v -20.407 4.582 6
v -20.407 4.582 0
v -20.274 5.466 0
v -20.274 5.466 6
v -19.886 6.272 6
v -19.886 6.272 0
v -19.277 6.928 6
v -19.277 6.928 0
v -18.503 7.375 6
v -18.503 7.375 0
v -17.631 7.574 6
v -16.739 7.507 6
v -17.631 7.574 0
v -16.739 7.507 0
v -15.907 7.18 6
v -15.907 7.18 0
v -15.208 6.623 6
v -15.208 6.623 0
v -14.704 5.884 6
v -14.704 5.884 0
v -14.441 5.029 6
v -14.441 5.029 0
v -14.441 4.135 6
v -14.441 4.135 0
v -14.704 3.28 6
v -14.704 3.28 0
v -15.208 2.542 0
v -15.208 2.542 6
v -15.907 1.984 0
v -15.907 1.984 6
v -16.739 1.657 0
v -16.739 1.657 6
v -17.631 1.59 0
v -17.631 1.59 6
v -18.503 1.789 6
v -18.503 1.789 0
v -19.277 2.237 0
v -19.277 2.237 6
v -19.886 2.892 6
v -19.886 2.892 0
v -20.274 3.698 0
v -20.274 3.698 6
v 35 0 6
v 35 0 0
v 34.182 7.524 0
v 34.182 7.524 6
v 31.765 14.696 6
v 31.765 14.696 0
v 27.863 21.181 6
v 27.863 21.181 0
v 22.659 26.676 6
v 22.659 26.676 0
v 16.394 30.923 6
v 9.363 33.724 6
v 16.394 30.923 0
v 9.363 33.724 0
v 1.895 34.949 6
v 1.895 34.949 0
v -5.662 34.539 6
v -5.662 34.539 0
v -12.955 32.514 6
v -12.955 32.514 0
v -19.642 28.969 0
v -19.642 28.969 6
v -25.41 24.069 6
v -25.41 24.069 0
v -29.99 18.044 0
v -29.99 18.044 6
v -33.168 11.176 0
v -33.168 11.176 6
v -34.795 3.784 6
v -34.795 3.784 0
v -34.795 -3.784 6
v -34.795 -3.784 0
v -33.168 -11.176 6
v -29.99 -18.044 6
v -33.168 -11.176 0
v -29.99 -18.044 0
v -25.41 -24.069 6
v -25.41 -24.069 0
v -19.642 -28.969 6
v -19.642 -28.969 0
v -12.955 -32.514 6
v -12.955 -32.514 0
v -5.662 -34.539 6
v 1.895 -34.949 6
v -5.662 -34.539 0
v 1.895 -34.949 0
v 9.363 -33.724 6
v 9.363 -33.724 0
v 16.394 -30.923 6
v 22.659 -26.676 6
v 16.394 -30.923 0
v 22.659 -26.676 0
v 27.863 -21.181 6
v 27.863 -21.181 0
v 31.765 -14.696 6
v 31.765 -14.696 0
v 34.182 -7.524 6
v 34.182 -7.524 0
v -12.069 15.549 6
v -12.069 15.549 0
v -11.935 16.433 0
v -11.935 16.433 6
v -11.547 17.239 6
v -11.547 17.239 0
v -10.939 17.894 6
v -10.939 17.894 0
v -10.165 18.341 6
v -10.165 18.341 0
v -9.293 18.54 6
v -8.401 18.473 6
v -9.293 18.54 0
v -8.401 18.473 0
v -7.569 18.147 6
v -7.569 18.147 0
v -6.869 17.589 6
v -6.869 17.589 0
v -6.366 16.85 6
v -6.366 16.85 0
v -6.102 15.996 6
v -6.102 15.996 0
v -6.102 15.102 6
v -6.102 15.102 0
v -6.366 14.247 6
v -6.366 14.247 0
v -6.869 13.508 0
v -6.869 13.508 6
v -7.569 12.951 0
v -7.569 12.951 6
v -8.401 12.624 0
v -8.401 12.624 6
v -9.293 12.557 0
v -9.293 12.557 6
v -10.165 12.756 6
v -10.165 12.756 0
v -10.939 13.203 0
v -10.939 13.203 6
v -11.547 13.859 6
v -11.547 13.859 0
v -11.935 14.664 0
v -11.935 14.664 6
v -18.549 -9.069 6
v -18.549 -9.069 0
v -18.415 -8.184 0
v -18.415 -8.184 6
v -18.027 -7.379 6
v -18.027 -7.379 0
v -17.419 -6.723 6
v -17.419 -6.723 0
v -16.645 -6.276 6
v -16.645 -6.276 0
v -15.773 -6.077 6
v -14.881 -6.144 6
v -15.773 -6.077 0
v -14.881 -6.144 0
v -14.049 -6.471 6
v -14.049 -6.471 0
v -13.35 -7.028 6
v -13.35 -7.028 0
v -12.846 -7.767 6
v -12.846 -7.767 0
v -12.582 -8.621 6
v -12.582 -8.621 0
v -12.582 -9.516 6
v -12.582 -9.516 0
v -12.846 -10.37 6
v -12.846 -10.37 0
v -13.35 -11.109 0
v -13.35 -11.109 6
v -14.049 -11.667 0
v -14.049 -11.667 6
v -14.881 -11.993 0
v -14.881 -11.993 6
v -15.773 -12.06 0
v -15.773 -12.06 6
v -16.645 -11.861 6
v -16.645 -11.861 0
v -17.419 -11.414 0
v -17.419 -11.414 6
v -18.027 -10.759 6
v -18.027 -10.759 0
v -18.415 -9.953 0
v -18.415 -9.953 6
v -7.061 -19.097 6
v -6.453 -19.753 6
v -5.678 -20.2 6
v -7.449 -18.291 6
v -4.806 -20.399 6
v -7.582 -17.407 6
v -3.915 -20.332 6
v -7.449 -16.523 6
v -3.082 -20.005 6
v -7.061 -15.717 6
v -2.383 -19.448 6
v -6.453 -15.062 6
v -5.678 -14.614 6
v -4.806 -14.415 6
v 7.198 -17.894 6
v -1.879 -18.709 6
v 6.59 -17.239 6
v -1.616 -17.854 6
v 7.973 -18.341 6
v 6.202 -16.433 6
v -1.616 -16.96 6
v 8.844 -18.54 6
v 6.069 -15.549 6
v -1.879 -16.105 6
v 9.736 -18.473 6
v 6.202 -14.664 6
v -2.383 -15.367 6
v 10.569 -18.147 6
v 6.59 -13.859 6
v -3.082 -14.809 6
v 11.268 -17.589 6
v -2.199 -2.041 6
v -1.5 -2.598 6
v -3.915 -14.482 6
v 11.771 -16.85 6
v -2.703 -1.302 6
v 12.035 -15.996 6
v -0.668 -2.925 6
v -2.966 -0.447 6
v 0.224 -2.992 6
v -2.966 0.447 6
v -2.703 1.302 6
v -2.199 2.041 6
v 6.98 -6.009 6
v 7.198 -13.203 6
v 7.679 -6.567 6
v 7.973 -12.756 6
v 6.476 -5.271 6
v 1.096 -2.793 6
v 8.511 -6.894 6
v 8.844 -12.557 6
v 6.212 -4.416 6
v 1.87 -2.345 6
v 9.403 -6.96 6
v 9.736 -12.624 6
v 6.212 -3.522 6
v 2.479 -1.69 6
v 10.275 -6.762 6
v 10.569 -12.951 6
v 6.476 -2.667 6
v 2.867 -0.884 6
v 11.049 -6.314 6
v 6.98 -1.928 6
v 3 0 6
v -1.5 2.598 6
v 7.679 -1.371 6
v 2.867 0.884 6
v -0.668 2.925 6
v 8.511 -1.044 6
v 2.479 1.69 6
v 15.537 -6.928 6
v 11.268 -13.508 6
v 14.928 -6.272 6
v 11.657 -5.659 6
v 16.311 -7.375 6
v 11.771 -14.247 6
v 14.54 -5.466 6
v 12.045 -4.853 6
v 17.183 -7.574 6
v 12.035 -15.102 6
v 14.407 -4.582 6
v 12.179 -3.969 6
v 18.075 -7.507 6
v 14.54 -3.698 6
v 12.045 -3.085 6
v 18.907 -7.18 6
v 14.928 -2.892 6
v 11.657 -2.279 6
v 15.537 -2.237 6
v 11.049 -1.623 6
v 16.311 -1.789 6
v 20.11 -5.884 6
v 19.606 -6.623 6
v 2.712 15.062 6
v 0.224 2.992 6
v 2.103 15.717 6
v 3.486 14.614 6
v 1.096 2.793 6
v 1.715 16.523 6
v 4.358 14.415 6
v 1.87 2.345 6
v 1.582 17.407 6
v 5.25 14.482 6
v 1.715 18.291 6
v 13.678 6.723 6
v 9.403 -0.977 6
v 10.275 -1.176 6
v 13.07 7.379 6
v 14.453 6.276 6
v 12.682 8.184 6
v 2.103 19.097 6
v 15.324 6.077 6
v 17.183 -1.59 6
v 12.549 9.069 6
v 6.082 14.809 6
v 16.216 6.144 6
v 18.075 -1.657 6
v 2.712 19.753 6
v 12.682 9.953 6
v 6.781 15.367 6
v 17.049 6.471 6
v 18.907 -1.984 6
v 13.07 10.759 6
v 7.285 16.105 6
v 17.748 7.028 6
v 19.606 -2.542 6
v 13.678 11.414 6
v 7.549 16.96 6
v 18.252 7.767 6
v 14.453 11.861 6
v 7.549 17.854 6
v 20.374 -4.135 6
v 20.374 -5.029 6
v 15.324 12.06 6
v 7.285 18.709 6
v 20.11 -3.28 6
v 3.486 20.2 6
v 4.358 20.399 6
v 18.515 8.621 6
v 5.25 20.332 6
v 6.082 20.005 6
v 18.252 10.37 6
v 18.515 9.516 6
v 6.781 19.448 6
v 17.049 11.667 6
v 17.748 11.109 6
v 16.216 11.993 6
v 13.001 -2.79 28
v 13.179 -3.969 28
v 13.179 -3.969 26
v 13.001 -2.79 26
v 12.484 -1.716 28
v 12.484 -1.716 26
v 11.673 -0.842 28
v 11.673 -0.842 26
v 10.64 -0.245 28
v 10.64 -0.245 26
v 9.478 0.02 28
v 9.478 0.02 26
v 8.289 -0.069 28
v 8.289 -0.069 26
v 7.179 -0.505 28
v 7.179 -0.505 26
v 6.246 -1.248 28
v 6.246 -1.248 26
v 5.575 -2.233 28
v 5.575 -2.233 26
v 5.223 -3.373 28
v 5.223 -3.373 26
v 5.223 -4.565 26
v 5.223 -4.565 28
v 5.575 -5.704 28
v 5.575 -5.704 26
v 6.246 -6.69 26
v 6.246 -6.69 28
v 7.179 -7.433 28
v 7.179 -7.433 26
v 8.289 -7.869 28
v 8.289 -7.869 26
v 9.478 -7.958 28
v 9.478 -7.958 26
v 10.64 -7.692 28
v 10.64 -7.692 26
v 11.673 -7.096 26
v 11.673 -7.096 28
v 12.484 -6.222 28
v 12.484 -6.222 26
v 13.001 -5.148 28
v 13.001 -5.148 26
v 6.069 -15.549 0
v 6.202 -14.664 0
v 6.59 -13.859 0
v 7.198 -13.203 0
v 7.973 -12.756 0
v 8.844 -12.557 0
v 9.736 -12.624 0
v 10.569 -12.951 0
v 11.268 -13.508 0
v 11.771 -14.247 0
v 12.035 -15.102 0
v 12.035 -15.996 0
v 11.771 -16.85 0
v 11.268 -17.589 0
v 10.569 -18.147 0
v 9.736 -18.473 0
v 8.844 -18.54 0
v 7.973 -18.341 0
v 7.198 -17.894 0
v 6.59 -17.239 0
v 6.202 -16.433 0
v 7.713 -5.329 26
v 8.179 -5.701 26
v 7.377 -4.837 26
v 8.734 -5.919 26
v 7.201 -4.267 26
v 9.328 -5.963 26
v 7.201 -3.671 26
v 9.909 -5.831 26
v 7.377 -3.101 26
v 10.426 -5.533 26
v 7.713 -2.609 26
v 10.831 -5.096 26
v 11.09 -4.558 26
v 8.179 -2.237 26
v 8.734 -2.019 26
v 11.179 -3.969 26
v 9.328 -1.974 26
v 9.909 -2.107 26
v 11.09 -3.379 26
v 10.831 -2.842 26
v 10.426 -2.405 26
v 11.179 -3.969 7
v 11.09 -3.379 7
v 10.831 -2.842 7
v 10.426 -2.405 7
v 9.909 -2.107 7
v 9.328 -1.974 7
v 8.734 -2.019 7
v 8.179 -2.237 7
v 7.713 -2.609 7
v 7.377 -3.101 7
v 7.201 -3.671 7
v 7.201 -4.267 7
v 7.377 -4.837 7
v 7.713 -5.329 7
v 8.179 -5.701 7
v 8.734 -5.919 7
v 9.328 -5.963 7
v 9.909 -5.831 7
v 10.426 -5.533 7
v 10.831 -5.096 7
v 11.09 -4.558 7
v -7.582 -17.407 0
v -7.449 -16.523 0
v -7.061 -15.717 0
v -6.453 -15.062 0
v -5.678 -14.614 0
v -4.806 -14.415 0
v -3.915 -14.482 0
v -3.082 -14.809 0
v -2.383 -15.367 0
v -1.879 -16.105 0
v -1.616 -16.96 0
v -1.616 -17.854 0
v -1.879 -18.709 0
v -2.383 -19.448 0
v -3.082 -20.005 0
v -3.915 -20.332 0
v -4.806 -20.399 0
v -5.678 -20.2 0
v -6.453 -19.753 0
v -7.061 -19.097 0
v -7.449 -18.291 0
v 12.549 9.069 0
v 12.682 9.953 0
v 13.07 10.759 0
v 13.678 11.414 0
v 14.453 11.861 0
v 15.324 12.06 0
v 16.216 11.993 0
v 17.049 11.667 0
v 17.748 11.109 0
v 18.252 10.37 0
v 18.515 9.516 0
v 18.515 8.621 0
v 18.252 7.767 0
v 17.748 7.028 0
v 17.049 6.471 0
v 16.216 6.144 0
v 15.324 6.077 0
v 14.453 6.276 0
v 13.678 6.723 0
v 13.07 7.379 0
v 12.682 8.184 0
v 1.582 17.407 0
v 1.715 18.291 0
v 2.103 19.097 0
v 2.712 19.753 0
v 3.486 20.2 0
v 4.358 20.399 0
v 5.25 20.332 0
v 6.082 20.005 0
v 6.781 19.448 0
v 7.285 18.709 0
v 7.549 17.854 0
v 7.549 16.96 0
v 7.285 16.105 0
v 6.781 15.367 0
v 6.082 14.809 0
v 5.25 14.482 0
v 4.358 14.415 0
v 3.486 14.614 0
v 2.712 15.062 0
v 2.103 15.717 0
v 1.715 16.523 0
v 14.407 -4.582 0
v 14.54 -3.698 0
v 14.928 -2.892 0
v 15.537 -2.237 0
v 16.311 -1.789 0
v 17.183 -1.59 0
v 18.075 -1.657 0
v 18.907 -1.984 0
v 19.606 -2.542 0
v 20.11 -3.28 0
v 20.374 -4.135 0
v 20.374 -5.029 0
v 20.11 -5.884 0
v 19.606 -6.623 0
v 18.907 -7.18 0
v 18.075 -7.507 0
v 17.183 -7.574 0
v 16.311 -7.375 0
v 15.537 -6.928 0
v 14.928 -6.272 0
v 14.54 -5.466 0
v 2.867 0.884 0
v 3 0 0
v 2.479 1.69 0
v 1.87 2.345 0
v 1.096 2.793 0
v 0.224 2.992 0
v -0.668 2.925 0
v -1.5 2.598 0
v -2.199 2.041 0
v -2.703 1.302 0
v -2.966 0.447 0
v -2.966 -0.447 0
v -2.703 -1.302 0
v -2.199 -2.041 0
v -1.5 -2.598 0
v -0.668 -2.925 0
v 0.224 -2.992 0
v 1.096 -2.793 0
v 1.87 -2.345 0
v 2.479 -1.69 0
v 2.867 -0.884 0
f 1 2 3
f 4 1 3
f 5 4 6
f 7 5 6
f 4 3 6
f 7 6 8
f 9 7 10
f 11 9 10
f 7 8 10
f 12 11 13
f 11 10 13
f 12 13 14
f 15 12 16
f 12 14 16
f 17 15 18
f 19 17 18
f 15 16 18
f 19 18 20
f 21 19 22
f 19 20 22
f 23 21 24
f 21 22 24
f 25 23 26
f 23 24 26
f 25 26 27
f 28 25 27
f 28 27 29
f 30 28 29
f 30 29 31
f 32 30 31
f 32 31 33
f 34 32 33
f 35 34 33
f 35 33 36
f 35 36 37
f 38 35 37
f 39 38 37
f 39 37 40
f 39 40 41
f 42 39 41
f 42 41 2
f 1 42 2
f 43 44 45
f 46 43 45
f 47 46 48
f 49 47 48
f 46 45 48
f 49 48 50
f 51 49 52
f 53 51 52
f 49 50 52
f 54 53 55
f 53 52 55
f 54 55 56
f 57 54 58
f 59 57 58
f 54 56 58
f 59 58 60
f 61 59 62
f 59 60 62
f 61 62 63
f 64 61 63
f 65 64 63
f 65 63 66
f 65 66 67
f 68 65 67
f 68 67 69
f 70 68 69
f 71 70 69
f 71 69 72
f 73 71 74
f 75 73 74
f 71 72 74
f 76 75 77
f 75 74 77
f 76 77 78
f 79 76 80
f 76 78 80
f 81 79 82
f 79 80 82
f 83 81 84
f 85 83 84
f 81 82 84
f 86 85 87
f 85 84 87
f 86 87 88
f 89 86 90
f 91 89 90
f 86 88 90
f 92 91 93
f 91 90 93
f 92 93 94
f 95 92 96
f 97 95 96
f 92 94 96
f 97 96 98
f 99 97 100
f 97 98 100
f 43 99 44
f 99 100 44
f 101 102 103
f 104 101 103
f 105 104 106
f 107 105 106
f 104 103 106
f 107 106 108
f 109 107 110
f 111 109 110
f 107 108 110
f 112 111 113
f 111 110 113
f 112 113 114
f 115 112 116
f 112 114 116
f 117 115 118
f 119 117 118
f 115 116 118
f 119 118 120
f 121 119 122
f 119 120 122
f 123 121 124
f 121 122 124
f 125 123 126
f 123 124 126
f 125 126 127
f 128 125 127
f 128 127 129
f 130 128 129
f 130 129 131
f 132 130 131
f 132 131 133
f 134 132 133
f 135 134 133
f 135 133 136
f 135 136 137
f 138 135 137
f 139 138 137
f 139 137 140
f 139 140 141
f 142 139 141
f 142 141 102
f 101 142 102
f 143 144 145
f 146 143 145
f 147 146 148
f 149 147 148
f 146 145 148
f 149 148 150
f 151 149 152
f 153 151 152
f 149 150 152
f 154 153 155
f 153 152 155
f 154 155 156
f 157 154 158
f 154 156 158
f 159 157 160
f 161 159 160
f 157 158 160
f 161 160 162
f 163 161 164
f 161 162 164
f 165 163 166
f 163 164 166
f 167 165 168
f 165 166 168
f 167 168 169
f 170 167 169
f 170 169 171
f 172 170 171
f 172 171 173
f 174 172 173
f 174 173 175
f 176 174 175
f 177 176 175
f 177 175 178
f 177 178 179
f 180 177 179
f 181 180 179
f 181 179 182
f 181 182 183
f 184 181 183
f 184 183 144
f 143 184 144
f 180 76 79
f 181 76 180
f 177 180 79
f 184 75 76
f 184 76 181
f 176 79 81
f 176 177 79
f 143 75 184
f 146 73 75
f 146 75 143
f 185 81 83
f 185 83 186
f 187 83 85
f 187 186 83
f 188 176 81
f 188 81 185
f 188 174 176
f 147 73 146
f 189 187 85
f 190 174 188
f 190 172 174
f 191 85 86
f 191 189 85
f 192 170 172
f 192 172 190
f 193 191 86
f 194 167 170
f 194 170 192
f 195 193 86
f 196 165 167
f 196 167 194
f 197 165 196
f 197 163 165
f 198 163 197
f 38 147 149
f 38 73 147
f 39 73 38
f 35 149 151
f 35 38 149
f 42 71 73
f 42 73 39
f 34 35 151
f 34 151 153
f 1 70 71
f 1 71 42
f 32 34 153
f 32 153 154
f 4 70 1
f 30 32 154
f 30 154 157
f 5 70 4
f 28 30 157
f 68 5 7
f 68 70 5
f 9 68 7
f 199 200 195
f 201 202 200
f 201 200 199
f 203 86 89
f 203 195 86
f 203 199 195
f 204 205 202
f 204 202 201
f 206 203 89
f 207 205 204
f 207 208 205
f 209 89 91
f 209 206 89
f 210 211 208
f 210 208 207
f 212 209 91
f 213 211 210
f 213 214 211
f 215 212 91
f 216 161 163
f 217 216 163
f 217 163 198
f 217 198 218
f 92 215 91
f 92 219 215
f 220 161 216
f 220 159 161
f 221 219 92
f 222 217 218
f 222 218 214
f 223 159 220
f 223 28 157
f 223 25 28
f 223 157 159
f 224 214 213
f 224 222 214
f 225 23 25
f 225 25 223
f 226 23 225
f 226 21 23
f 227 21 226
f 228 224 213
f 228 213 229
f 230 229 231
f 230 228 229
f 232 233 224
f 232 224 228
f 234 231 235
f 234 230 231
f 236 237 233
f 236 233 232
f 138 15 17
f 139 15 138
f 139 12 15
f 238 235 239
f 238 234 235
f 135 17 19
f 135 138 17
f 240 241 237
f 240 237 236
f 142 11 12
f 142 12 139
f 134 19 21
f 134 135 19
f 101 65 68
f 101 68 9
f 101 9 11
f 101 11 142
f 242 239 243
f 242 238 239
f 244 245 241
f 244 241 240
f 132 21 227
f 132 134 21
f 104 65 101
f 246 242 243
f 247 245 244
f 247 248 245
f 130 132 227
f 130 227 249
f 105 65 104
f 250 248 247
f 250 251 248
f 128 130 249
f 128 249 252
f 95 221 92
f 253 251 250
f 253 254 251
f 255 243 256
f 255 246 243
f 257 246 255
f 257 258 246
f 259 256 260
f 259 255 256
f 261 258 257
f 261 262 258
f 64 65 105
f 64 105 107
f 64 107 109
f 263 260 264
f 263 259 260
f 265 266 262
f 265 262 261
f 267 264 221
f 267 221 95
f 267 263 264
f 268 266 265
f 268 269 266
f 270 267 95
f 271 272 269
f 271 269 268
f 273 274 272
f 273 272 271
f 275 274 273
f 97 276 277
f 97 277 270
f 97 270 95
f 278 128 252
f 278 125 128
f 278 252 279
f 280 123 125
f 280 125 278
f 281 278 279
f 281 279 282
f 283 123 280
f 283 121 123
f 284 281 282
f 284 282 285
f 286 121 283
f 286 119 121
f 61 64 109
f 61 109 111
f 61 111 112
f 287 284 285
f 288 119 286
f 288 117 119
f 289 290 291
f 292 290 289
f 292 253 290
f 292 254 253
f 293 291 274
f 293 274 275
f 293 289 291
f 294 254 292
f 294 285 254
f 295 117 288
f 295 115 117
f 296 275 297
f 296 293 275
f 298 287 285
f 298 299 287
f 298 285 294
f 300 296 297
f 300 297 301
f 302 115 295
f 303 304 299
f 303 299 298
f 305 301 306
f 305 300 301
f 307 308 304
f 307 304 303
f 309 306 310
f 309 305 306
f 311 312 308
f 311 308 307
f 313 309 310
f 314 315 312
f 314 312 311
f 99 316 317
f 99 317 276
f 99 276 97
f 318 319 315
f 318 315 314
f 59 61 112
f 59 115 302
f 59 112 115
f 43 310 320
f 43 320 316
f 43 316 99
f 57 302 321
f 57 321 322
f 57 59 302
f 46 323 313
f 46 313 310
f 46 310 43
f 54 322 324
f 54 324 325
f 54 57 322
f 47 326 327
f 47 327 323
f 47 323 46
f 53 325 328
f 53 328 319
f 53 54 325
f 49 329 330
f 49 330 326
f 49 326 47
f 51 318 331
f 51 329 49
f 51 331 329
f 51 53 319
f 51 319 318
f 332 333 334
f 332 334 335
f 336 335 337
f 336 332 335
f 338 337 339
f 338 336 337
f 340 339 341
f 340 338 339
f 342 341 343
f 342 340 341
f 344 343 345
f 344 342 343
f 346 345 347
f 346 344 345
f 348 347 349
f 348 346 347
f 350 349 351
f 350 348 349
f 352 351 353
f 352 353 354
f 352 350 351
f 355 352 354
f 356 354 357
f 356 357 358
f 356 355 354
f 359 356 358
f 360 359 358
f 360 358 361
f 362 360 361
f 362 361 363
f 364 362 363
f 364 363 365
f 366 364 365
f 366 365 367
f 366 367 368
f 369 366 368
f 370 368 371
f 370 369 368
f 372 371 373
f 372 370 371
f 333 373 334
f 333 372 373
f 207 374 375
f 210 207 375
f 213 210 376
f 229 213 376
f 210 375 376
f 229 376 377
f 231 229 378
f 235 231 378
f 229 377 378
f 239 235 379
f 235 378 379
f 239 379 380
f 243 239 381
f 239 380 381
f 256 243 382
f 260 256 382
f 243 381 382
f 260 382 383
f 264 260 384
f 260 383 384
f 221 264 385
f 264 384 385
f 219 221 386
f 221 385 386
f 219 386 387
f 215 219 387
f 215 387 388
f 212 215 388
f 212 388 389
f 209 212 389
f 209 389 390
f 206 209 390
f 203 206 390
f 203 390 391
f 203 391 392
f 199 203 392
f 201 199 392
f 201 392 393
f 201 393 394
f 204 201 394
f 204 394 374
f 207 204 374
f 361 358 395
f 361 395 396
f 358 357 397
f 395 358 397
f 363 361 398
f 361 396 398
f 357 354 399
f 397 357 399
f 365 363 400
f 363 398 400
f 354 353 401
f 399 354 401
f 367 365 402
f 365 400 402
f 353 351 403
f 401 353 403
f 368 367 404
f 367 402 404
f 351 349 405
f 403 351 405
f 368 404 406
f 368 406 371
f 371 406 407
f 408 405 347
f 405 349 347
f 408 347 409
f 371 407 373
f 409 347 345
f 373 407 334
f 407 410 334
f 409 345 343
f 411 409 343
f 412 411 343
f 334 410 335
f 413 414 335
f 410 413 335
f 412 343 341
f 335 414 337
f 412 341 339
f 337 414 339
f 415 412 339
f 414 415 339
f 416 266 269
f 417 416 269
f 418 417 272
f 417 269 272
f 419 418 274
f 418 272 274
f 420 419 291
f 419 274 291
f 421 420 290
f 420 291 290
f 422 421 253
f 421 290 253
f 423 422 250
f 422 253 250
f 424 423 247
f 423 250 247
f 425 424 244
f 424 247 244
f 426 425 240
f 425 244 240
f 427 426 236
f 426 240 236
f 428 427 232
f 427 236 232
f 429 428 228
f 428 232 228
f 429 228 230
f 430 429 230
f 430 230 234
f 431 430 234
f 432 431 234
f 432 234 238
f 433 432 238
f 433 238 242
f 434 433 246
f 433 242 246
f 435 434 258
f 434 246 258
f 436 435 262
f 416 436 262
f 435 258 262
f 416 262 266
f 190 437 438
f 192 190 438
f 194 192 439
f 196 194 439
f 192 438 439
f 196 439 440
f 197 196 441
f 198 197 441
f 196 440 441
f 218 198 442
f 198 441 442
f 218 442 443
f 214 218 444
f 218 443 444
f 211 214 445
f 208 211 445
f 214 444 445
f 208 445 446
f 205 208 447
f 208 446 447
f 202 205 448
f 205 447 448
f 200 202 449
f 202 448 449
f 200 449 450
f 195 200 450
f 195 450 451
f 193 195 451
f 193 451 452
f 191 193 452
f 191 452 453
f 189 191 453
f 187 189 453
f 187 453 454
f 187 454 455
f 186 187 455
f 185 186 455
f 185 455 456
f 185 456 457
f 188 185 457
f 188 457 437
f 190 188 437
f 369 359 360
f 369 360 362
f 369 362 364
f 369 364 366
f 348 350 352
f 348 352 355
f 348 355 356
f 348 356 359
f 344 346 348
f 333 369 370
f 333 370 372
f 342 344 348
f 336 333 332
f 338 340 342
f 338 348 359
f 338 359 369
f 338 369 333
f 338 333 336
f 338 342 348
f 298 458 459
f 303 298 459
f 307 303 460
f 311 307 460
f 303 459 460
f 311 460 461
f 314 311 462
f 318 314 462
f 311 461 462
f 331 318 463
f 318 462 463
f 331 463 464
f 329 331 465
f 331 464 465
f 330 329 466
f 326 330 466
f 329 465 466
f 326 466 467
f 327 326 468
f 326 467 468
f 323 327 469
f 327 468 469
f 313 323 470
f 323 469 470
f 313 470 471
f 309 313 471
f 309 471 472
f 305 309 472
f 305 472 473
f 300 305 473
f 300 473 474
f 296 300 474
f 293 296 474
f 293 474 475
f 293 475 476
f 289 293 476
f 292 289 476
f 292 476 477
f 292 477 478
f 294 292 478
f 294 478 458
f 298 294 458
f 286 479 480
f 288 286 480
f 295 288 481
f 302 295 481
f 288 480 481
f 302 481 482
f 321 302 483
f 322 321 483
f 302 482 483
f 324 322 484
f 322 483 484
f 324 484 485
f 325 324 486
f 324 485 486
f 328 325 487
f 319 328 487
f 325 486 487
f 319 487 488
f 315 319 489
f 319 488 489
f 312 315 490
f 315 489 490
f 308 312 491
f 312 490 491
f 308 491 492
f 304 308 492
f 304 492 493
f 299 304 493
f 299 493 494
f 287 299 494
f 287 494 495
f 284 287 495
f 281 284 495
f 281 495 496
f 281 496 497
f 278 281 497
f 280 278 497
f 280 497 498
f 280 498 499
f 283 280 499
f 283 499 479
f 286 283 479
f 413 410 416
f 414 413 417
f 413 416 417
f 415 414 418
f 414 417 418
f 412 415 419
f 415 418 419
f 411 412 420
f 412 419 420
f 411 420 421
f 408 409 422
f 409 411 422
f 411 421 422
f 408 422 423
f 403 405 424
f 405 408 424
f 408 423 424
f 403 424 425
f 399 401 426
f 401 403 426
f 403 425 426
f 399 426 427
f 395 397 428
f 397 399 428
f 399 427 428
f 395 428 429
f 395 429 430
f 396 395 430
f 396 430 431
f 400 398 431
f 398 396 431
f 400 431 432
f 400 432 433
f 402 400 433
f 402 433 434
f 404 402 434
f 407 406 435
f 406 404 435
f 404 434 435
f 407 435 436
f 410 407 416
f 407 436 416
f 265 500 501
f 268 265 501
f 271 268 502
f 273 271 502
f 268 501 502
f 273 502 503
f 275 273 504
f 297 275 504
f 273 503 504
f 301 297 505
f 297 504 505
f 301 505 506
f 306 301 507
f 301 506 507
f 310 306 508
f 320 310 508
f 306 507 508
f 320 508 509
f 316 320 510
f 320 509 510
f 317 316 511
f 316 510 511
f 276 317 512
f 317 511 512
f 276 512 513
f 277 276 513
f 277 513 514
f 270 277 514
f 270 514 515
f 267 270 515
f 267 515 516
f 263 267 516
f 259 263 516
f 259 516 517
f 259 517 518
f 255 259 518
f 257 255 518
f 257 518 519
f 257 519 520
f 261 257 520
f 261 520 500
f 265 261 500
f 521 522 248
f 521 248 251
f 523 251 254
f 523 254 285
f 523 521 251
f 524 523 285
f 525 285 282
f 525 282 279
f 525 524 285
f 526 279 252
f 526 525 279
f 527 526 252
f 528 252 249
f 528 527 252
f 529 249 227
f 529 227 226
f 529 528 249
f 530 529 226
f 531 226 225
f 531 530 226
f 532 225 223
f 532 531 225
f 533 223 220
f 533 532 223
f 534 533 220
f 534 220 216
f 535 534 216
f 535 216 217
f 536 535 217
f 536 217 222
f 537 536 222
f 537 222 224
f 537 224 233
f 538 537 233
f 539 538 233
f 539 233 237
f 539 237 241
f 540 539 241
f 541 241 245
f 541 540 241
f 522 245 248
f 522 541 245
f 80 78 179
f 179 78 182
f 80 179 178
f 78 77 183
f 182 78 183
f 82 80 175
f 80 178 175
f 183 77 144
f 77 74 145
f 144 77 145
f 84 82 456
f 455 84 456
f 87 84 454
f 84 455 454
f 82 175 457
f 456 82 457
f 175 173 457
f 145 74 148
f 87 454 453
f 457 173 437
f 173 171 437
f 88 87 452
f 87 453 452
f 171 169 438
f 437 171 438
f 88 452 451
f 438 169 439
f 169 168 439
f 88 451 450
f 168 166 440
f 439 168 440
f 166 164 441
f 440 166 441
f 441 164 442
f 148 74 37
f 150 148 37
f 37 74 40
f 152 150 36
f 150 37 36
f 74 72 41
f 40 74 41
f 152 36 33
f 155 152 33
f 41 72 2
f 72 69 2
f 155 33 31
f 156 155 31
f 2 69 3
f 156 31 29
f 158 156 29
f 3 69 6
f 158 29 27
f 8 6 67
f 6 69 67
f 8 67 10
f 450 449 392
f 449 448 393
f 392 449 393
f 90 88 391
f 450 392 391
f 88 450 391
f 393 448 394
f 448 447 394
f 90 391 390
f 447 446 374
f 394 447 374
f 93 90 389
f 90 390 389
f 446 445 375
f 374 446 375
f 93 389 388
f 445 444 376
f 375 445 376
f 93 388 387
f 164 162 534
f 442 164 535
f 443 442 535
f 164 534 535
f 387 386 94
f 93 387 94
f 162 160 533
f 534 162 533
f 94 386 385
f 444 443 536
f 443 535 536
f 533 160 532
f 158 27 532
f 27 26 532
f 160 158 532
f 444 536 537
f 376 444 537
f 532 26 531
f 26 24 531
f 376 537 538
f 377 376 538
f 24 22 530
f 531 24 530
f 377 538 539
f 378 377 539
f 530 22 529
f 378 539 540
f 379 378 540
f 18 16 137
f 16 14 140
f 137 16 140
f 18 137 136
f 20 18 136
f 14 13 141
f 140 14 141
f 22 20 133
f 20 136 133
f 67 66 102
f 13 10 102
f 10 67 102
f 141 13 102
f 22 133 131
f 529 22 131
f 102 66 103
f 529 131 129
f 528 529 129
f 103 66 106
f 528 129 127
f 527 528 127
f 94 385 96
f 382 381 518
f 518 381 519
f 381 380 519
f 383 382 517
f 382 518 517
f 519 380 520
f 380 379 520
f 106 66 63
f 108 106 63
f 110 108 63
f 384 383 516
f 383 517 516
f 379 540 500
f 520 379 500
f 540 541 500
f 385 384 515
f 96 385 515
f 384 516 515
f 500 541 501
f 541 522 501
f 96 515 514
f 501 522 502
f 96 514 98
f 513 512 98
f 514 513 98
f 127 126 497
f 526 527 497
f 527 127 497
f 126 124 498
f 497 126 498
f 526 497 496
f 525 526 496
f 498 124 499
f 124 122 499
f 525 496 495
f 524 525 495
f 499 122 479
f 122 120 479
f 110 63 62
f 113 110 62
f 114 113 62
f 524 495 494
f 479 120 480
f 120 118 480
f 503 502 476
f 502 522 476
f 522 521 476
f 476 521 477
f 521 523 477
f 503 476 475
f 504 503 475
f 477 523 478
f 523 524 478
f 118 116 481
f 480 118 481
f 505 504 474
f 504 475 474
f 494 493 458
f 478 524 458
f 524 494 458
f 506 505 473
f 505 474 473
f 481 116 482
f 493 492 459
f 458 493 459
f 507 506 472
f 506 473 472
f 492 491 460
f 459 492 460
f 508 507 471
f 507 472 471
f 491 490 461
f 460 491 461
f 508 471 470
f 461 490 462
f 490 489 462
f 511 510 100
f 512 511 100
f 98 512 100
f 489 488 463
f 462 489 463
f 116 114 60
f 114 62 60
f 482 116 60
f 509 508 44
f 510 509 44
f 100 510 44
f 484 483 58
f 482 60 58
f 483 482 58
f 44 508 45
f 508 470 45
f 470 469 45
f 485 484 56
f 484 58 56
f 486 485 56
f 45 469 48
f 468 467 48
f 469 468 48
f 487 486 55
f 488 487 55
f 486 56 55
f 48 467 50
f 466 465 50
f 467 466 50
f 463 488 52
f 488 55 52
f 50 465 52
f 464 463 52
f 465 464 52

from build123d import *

# Parameters (mm, degrees)
SKETCH_1_R          = 35
SKETCH_1_R_2        = 3
EXTRUDE_1_DEPTH     = 6
SKETCH_3_R          = 3
CUT_EXTRUDE_2_DEPTH = 50.859803449
SKETCH_4_R          = 2
EXTRUDE_2_DEPTH     = 22
SKETCH_7_R          = 4
EXTRUDE_3_DEPTH     = 2
CHAMFER_1_SIZE      = 1


with BuildPart() as part:
    # 草图1 → 凸台-拉伸1 (new body)
    with BuildSketch(Plane.XY):
        Circle(SKETCH_1_R)
        Circle(SKETCH_1_R_2, mode=Mode.SUBTRACT)
    extrude(amount=EXTRUDE_1_DEPTH)

    # 草图3 → 切除-拉伸2 (cut, through all)
    with BuildSketch(Plane(origin=(0, 0, 0), x_dir=(-1, 0, 0), z_dir=(0, 0, -1))):
        with Locations((-4.582105158, 17.407019053)):
            Circle(SKETCH_3_R)
        with Locations((9.068583583, 15.548658842)):
            Circle(SKETCH_3_R)
        with Locations((17.407019053, 4.582105158)):
            Circle(SKETCH_3_R)
        with Locations((15.548658842, -9.068583583)):
            Circle(SKETCH_3_R)
        with Locations((4.582105158, -17.407019053)):
            Circle(SKETCH_3_R)
        with Locations((-9.068583583, -15.548658842)):
            Circle(SKETCH_3_R)
        with Locations((-17.407019053, -4.582105158)):
            Circle(SKETCH_3_R)
        with Locations((-15.548658842, 9.068583583)):
            Circle(SKETCH_3_R)
    extrude(amount=-CUT_EXTRUDE_2_DEPTH, mode=Mode.SUBTRACT)

    # 草图4 → 凸台-拉伸2 (add)
    with BuildSketch(Plane.XY.offset(6)):
        with Locations((9.178670771, -3.968879298)):
            Circle(SKETCH_4_R)
    extrude(amount=EXTRUDE_2_DEPTH)

    # 草图7 → 凸台-拉伸3 (add)
    with BuildSketch(Plane.XY.offset(28)):
        with Locations((9.178670771, -3.968879298)):
            Circle(SKETCH_7_R)
    extrude(amount=-EXTRUDE_3_DEPTH)

    # 倒角1
    chamfer_1_edges = [part.edges().sort_by_distance(p)[0] for p in [
        (7.178670771, -3.968879298, 6),
    ]]
    chamfer(chamfer_1_edges, length=CHAMFER_1_SIZE)


solid = part.part
